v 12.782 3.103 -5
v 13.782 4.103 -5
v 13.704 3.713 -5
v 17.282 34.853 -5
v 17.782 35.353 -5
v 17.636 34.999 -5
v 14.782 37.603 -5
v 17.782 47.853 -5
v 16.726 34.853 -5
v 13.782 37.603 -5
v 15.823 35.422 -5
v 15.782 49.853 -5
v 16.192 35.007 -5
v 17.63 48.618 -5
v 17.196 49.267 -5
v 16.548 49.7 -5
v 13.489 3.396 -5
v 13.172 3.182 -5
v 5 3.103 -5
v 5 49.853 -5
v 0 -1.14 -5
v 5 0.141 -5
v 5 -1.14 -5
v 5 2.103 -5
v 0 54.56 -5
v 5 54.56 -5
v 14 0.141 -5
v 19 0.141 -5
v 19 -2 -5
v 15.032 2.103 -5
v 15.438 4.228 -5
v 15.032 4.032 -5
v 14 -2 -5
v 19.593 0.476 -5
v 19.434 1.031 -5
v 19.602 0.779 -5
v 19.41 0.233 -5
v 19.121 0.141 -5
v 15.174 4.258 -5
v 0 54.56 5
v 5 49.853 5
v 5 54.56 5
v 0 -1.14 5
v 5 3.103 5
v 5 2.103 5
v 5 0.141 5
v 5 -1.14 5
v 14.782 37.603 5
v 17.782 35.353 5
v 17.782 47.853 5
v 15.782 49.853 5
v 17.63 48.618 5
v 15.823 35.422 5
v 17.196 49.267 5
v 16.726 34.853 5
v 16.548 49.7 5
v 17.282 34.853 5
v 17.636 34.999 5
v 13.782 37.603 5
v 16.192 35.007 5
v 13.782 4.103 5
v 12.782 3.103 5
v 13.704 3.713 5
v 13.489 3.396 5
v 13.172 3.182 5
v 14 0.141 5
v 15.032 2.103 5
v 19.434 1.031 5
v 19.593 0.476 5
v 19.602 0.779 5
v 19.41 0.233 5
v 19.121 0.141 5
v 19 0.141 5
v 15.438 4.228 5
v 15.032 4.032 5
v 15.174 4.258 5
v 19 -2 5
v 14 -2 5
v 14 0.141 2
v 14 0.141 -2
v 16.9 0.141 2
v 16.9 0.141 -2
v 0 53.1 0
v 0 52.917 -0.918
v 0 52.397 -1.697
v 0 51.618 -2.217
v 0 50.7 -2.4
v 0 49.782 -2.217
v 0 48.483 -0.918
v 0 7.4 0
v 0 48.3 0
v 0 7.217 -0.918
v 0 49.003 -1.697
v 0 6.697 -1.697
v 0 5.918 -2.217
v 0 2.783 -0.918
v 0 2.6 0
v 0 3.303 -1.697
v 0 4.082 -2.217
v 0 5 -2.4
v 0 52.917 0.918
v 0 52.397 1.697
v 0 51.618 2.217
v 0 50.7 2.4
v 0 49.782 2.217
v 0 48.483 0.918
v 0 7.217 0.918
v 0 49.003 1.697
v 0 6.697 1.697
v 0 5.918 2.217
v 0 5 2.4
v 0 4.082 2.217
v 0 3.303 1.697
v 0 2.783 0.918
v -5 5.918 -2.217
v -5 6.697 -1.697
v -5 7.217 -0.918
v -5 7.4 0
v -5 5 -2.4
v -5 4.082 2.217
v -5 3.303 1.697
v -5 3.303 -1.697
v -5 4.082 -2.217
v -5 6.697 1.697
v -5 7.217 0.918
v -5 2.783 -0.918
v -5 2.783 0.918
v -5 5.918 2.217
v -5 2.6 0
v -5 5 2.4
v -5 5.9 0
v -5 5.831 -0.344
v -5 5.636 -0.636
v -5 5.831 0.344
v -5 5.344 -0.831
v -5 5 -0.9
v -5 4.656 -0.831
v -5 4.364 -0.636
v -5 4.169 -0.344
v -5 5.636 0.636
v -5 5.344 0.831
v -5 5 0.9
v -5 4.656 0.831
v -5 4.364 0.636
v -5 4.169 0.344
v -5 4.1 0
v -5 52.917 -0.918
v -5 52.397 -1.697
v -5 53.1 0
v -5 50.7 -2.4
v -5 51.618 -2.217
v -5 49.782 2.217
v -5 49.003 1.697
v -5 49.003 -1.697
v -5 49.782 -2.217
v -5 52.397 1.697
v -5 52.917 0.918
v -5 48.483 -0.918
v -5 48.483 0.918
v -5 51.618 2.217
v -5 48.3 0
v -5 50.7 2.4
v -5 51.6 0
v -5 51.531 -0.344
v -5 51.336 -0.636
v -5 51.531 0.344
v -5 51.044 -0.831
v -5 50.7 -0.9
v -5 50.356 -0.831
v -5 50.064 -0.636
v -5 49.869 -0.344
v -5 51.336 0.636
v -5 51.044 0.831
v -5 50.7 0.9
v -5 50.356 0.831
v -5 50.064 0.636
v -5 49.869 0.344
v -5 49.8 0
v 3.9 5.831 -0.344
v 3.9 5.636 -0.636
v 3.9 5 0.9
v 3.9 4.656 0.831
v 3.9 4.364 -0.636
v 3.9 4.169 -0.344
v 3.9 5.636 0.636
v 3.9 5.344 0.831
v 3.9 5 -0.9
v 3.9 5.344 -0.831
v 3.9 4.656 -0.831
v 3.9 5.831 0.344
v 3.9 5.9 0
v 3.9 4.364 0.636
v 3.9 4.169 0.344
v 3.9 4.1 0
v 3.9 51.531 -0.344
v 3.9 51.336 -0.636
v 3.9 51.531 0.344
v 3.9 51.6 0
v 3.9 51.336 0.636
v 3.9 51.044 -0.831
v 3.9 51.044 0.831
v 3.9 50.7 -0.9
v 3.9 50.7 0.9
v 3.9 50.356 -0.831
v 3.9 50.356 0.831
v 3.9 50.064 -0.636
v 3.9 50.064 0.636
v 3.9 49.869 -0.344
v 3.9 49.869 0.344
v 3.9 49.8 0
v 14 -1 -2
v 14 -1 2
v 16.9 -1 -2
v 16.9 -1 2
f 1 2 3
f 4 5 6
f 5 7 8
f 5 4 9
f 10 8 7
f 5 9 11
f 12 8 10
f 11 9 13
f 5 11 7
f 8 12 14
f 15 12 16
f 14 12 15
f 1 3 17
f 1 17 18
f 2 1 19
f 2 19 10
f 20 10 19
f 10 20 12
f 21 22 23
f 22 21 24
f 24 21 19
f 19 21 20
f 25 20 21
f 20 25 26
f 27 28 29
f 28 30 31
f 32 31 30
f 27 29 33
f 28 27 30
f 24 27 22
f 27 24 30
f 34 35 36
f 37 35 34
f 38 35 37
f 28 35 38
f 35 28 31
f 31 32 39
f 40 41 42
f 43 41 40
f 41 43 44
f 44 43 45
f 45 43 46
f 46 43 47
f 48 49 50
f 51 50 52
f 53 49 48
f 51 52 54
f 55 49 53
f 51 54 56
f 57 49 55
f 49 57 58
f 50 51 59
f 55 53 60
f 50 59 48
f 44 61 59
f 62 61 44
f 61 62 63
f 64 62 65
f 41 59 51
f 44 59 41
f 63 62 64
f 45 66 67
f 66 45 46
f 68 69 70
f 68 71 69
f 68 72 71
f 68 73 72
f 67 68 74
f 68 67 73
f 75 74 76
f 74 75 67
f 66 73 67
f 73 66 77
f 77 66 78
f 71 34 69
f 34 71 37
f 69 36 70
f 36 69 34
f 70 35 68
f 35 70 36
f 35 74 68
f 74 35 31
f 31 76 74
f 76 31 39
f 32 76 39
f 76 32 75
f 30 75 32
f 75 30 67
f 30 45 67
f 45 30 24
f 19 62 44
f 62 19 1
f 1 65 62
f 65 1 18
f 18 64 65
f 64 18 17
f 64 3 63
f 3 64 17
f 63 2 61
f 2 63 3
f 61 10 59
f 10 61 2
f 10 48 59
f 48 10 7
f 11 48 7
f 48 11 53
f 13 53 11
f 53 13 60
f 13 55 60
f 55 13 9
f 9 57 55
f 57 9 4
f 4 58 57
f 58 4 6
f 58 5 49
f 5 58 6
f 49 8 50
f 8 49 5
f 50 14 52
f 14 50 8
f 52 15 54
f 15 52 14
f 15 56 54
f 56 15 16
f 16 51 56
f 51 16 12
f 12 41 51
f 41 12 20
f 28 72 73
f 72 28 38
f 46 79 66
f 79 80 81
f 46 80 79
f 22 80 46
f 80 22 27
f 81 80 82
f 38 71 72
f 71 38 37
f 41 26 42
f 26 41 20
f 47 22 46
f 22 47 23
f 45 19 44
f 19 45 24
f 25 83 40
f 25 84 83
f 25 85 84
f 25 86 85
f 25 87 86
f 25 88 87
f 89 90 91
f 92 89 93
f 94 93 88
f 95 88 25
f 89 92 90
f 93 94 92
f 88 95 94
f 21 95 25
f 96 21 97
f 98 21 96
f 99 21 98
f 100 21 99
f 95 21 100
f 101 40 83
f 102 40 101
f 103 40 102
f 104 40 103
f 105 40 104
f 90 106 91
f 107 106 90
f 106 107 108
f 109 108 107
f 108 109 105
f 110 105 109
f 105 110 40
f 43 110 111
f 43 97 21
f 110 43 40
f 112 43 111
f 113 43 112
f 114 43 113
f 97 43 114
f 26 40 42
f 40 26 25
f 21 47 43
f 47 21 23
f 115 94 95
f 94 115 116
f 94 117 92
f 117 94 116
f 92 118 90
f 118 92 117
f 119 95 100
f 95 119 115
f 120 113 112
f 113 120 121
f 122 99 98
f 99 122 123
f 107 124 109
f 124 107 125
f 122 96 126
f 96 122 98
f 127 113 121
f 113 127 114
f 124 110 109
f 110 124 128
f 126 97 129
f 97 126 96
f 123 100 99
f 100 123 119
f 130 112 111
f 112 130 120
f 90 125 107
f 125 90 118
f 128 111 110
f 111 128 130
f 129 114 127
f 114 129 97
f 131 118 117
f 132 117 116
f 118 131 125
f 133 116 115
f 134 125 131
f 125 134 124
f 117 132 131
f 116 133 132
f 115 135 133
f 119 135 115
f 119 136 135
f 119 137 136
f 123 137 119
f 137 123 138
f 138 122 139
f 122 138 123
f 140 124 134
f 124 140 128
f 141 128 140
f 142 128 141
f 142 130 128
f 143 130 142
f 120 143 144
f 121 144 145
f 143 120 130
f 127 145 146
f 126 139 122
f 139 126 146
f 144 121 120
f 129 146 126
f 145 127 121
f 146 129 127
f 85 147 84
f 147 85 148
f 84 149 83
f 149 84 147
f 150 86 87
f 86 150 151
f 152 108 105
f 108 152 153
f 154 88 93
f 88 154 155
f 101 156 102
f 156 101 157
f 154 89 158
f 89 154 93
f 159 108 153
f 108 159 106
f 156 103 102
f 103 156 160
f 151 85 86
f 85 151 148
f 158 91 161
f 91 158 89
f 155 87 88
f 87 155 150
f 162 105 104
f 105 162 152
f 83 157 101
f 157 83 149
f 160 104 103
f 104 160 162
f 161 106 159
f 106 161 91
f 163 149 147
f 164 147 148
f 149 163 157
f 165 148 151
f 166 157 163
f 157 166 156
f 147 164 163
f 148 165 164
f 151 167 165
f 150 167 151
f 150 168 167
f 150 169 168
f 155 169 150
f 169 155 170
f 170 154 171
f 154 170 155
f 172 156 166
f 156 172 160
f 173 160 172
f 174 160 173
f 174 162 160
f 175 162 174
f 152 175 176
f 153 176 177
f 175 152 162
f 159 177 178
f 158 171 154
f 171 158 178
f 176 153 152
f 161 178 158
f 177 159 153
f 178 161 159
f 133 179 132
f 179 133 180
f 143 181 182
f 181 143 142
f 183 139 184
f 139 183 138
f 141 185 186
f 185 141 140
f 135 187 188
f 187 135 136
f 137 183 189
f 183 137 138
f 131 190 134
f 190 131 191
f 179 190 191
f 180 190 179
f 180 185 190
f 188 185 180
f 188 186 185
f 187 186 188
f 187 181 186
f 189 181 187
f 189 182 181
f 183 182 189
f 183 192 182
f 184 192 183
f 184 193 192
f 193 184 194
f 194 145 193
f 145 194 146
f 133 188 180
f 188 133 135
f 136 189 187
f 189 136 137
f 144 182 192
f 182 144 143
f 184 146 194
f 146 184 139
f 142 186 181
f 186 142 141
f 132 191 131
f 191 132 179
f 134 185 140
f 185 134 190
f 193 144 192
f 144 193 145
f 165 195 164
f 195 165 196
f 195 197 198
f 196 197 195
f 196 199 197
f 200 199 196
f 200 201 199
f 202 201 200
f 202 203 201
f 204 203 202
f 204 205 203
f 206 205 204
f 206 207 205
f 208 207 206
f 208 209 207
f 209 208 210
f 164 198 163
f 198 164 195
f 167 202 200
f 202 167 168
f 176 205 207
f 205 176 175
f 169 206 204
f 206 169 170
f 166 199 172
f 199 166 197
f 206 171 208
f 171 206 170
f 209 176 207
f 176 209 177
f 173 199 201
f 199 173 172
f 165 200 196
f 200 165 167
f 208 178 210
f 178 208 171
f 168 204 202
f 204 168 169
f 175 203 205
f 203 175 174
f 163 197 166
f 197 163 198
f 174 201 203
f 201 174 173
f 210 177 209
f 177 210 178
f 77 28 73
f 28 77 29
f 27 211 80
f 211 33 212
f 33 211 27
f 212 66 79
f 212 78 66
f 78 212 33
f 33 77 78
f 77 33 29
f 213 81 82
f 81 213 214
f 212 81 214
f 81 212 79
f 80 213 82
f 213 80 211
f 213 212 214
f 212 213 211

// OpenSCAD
CLIP_H = 10;
HOLE_DEPTH = 9;
HOLE_DIAMETER = 1.8;
HOLE_DISTANCE=45.7;
// HOLE_DISTANCE=2.54 * 17; // number of island on a perfboad.
HOLE_OFF=2.54 * 0; // number of holes shifted along axis
LEN=50; // in effect hardcoded in the DXF file.
BAR=HOLE_DISTANCE + 10; // 5mm either side of the drill holes.
POT_H = 5;
POT_DIAMETER = HOLE_DIAMETER + 3;
module din_clip() {
	
 union() {
	difference() {

        union() {
		linear_extrude(height=CLIP_H, center=true, convexity=5) {
			import(file="din_clip_01.dxf", layer="0", $fn=64);
		}
        // rather then center - we sort of move up so you
        // can reach the clip a bit easier.
        translate([0,-(BAR-LEN)/5,-CLIP_H/2]) cube([5,BAR,CLIP_H]);
        
        // pots'
			translate([-POT_H, (BAR-HOLE_DISTANCE)/2, HOLE_OFF/2]) {
				rotate([0, 90, 0]) {
					cylinder(h= HOLE_DEPTH, r = POT_DIAMETER/2 , $fn = 16);
				}
			}

			translate([-POT_H, (BAR+HOLE_DISTANCE)/2, -HOLE_OFF/2]) {
				rotate([0, 90, 0]) {
					cylinder(h= HOLE_DEPTH, r = POT_DIAMETER/2 , $fn = 16);
				}
			}
       };
		union() {
			translate([-POT_H-0.1, (BAR-HOLE_DISTANCE)/2, HOLE_OFF/2]) {
				rotate([0, 90, 0]) {
					cylinder(h= HOLE_DEPTH, r = HOLE_DIAMETER / 2, $fn = 16);
				}
			}

			translate([-POT_H-0.1, (BAR+HOLE_DISTANCE)/2, -HOLE_OFF/2]) {
				rotate([0, 90, 0]) {
					cylinder(h= HOLE_DEPTH, r = HOLE_DIAMETER / 2, $fn = 16);
				}
			}
		}
 }; // end of the clip with holes
 // hook/tabl for the screwdriver.
 union() {
  TAB=5;
  BLADE=4; //width screwdriver blade.
  translate([14,-2,-CLIP_H/2]) {
   difference() {
    cube([TAB,3,CLIP_H]);
    translate([-0.1,1, (CLIP_H-BLADE)/2]) cube([3,BLADE/2,BLADE]);
   }
  }
 }
}
}

din_clip();
